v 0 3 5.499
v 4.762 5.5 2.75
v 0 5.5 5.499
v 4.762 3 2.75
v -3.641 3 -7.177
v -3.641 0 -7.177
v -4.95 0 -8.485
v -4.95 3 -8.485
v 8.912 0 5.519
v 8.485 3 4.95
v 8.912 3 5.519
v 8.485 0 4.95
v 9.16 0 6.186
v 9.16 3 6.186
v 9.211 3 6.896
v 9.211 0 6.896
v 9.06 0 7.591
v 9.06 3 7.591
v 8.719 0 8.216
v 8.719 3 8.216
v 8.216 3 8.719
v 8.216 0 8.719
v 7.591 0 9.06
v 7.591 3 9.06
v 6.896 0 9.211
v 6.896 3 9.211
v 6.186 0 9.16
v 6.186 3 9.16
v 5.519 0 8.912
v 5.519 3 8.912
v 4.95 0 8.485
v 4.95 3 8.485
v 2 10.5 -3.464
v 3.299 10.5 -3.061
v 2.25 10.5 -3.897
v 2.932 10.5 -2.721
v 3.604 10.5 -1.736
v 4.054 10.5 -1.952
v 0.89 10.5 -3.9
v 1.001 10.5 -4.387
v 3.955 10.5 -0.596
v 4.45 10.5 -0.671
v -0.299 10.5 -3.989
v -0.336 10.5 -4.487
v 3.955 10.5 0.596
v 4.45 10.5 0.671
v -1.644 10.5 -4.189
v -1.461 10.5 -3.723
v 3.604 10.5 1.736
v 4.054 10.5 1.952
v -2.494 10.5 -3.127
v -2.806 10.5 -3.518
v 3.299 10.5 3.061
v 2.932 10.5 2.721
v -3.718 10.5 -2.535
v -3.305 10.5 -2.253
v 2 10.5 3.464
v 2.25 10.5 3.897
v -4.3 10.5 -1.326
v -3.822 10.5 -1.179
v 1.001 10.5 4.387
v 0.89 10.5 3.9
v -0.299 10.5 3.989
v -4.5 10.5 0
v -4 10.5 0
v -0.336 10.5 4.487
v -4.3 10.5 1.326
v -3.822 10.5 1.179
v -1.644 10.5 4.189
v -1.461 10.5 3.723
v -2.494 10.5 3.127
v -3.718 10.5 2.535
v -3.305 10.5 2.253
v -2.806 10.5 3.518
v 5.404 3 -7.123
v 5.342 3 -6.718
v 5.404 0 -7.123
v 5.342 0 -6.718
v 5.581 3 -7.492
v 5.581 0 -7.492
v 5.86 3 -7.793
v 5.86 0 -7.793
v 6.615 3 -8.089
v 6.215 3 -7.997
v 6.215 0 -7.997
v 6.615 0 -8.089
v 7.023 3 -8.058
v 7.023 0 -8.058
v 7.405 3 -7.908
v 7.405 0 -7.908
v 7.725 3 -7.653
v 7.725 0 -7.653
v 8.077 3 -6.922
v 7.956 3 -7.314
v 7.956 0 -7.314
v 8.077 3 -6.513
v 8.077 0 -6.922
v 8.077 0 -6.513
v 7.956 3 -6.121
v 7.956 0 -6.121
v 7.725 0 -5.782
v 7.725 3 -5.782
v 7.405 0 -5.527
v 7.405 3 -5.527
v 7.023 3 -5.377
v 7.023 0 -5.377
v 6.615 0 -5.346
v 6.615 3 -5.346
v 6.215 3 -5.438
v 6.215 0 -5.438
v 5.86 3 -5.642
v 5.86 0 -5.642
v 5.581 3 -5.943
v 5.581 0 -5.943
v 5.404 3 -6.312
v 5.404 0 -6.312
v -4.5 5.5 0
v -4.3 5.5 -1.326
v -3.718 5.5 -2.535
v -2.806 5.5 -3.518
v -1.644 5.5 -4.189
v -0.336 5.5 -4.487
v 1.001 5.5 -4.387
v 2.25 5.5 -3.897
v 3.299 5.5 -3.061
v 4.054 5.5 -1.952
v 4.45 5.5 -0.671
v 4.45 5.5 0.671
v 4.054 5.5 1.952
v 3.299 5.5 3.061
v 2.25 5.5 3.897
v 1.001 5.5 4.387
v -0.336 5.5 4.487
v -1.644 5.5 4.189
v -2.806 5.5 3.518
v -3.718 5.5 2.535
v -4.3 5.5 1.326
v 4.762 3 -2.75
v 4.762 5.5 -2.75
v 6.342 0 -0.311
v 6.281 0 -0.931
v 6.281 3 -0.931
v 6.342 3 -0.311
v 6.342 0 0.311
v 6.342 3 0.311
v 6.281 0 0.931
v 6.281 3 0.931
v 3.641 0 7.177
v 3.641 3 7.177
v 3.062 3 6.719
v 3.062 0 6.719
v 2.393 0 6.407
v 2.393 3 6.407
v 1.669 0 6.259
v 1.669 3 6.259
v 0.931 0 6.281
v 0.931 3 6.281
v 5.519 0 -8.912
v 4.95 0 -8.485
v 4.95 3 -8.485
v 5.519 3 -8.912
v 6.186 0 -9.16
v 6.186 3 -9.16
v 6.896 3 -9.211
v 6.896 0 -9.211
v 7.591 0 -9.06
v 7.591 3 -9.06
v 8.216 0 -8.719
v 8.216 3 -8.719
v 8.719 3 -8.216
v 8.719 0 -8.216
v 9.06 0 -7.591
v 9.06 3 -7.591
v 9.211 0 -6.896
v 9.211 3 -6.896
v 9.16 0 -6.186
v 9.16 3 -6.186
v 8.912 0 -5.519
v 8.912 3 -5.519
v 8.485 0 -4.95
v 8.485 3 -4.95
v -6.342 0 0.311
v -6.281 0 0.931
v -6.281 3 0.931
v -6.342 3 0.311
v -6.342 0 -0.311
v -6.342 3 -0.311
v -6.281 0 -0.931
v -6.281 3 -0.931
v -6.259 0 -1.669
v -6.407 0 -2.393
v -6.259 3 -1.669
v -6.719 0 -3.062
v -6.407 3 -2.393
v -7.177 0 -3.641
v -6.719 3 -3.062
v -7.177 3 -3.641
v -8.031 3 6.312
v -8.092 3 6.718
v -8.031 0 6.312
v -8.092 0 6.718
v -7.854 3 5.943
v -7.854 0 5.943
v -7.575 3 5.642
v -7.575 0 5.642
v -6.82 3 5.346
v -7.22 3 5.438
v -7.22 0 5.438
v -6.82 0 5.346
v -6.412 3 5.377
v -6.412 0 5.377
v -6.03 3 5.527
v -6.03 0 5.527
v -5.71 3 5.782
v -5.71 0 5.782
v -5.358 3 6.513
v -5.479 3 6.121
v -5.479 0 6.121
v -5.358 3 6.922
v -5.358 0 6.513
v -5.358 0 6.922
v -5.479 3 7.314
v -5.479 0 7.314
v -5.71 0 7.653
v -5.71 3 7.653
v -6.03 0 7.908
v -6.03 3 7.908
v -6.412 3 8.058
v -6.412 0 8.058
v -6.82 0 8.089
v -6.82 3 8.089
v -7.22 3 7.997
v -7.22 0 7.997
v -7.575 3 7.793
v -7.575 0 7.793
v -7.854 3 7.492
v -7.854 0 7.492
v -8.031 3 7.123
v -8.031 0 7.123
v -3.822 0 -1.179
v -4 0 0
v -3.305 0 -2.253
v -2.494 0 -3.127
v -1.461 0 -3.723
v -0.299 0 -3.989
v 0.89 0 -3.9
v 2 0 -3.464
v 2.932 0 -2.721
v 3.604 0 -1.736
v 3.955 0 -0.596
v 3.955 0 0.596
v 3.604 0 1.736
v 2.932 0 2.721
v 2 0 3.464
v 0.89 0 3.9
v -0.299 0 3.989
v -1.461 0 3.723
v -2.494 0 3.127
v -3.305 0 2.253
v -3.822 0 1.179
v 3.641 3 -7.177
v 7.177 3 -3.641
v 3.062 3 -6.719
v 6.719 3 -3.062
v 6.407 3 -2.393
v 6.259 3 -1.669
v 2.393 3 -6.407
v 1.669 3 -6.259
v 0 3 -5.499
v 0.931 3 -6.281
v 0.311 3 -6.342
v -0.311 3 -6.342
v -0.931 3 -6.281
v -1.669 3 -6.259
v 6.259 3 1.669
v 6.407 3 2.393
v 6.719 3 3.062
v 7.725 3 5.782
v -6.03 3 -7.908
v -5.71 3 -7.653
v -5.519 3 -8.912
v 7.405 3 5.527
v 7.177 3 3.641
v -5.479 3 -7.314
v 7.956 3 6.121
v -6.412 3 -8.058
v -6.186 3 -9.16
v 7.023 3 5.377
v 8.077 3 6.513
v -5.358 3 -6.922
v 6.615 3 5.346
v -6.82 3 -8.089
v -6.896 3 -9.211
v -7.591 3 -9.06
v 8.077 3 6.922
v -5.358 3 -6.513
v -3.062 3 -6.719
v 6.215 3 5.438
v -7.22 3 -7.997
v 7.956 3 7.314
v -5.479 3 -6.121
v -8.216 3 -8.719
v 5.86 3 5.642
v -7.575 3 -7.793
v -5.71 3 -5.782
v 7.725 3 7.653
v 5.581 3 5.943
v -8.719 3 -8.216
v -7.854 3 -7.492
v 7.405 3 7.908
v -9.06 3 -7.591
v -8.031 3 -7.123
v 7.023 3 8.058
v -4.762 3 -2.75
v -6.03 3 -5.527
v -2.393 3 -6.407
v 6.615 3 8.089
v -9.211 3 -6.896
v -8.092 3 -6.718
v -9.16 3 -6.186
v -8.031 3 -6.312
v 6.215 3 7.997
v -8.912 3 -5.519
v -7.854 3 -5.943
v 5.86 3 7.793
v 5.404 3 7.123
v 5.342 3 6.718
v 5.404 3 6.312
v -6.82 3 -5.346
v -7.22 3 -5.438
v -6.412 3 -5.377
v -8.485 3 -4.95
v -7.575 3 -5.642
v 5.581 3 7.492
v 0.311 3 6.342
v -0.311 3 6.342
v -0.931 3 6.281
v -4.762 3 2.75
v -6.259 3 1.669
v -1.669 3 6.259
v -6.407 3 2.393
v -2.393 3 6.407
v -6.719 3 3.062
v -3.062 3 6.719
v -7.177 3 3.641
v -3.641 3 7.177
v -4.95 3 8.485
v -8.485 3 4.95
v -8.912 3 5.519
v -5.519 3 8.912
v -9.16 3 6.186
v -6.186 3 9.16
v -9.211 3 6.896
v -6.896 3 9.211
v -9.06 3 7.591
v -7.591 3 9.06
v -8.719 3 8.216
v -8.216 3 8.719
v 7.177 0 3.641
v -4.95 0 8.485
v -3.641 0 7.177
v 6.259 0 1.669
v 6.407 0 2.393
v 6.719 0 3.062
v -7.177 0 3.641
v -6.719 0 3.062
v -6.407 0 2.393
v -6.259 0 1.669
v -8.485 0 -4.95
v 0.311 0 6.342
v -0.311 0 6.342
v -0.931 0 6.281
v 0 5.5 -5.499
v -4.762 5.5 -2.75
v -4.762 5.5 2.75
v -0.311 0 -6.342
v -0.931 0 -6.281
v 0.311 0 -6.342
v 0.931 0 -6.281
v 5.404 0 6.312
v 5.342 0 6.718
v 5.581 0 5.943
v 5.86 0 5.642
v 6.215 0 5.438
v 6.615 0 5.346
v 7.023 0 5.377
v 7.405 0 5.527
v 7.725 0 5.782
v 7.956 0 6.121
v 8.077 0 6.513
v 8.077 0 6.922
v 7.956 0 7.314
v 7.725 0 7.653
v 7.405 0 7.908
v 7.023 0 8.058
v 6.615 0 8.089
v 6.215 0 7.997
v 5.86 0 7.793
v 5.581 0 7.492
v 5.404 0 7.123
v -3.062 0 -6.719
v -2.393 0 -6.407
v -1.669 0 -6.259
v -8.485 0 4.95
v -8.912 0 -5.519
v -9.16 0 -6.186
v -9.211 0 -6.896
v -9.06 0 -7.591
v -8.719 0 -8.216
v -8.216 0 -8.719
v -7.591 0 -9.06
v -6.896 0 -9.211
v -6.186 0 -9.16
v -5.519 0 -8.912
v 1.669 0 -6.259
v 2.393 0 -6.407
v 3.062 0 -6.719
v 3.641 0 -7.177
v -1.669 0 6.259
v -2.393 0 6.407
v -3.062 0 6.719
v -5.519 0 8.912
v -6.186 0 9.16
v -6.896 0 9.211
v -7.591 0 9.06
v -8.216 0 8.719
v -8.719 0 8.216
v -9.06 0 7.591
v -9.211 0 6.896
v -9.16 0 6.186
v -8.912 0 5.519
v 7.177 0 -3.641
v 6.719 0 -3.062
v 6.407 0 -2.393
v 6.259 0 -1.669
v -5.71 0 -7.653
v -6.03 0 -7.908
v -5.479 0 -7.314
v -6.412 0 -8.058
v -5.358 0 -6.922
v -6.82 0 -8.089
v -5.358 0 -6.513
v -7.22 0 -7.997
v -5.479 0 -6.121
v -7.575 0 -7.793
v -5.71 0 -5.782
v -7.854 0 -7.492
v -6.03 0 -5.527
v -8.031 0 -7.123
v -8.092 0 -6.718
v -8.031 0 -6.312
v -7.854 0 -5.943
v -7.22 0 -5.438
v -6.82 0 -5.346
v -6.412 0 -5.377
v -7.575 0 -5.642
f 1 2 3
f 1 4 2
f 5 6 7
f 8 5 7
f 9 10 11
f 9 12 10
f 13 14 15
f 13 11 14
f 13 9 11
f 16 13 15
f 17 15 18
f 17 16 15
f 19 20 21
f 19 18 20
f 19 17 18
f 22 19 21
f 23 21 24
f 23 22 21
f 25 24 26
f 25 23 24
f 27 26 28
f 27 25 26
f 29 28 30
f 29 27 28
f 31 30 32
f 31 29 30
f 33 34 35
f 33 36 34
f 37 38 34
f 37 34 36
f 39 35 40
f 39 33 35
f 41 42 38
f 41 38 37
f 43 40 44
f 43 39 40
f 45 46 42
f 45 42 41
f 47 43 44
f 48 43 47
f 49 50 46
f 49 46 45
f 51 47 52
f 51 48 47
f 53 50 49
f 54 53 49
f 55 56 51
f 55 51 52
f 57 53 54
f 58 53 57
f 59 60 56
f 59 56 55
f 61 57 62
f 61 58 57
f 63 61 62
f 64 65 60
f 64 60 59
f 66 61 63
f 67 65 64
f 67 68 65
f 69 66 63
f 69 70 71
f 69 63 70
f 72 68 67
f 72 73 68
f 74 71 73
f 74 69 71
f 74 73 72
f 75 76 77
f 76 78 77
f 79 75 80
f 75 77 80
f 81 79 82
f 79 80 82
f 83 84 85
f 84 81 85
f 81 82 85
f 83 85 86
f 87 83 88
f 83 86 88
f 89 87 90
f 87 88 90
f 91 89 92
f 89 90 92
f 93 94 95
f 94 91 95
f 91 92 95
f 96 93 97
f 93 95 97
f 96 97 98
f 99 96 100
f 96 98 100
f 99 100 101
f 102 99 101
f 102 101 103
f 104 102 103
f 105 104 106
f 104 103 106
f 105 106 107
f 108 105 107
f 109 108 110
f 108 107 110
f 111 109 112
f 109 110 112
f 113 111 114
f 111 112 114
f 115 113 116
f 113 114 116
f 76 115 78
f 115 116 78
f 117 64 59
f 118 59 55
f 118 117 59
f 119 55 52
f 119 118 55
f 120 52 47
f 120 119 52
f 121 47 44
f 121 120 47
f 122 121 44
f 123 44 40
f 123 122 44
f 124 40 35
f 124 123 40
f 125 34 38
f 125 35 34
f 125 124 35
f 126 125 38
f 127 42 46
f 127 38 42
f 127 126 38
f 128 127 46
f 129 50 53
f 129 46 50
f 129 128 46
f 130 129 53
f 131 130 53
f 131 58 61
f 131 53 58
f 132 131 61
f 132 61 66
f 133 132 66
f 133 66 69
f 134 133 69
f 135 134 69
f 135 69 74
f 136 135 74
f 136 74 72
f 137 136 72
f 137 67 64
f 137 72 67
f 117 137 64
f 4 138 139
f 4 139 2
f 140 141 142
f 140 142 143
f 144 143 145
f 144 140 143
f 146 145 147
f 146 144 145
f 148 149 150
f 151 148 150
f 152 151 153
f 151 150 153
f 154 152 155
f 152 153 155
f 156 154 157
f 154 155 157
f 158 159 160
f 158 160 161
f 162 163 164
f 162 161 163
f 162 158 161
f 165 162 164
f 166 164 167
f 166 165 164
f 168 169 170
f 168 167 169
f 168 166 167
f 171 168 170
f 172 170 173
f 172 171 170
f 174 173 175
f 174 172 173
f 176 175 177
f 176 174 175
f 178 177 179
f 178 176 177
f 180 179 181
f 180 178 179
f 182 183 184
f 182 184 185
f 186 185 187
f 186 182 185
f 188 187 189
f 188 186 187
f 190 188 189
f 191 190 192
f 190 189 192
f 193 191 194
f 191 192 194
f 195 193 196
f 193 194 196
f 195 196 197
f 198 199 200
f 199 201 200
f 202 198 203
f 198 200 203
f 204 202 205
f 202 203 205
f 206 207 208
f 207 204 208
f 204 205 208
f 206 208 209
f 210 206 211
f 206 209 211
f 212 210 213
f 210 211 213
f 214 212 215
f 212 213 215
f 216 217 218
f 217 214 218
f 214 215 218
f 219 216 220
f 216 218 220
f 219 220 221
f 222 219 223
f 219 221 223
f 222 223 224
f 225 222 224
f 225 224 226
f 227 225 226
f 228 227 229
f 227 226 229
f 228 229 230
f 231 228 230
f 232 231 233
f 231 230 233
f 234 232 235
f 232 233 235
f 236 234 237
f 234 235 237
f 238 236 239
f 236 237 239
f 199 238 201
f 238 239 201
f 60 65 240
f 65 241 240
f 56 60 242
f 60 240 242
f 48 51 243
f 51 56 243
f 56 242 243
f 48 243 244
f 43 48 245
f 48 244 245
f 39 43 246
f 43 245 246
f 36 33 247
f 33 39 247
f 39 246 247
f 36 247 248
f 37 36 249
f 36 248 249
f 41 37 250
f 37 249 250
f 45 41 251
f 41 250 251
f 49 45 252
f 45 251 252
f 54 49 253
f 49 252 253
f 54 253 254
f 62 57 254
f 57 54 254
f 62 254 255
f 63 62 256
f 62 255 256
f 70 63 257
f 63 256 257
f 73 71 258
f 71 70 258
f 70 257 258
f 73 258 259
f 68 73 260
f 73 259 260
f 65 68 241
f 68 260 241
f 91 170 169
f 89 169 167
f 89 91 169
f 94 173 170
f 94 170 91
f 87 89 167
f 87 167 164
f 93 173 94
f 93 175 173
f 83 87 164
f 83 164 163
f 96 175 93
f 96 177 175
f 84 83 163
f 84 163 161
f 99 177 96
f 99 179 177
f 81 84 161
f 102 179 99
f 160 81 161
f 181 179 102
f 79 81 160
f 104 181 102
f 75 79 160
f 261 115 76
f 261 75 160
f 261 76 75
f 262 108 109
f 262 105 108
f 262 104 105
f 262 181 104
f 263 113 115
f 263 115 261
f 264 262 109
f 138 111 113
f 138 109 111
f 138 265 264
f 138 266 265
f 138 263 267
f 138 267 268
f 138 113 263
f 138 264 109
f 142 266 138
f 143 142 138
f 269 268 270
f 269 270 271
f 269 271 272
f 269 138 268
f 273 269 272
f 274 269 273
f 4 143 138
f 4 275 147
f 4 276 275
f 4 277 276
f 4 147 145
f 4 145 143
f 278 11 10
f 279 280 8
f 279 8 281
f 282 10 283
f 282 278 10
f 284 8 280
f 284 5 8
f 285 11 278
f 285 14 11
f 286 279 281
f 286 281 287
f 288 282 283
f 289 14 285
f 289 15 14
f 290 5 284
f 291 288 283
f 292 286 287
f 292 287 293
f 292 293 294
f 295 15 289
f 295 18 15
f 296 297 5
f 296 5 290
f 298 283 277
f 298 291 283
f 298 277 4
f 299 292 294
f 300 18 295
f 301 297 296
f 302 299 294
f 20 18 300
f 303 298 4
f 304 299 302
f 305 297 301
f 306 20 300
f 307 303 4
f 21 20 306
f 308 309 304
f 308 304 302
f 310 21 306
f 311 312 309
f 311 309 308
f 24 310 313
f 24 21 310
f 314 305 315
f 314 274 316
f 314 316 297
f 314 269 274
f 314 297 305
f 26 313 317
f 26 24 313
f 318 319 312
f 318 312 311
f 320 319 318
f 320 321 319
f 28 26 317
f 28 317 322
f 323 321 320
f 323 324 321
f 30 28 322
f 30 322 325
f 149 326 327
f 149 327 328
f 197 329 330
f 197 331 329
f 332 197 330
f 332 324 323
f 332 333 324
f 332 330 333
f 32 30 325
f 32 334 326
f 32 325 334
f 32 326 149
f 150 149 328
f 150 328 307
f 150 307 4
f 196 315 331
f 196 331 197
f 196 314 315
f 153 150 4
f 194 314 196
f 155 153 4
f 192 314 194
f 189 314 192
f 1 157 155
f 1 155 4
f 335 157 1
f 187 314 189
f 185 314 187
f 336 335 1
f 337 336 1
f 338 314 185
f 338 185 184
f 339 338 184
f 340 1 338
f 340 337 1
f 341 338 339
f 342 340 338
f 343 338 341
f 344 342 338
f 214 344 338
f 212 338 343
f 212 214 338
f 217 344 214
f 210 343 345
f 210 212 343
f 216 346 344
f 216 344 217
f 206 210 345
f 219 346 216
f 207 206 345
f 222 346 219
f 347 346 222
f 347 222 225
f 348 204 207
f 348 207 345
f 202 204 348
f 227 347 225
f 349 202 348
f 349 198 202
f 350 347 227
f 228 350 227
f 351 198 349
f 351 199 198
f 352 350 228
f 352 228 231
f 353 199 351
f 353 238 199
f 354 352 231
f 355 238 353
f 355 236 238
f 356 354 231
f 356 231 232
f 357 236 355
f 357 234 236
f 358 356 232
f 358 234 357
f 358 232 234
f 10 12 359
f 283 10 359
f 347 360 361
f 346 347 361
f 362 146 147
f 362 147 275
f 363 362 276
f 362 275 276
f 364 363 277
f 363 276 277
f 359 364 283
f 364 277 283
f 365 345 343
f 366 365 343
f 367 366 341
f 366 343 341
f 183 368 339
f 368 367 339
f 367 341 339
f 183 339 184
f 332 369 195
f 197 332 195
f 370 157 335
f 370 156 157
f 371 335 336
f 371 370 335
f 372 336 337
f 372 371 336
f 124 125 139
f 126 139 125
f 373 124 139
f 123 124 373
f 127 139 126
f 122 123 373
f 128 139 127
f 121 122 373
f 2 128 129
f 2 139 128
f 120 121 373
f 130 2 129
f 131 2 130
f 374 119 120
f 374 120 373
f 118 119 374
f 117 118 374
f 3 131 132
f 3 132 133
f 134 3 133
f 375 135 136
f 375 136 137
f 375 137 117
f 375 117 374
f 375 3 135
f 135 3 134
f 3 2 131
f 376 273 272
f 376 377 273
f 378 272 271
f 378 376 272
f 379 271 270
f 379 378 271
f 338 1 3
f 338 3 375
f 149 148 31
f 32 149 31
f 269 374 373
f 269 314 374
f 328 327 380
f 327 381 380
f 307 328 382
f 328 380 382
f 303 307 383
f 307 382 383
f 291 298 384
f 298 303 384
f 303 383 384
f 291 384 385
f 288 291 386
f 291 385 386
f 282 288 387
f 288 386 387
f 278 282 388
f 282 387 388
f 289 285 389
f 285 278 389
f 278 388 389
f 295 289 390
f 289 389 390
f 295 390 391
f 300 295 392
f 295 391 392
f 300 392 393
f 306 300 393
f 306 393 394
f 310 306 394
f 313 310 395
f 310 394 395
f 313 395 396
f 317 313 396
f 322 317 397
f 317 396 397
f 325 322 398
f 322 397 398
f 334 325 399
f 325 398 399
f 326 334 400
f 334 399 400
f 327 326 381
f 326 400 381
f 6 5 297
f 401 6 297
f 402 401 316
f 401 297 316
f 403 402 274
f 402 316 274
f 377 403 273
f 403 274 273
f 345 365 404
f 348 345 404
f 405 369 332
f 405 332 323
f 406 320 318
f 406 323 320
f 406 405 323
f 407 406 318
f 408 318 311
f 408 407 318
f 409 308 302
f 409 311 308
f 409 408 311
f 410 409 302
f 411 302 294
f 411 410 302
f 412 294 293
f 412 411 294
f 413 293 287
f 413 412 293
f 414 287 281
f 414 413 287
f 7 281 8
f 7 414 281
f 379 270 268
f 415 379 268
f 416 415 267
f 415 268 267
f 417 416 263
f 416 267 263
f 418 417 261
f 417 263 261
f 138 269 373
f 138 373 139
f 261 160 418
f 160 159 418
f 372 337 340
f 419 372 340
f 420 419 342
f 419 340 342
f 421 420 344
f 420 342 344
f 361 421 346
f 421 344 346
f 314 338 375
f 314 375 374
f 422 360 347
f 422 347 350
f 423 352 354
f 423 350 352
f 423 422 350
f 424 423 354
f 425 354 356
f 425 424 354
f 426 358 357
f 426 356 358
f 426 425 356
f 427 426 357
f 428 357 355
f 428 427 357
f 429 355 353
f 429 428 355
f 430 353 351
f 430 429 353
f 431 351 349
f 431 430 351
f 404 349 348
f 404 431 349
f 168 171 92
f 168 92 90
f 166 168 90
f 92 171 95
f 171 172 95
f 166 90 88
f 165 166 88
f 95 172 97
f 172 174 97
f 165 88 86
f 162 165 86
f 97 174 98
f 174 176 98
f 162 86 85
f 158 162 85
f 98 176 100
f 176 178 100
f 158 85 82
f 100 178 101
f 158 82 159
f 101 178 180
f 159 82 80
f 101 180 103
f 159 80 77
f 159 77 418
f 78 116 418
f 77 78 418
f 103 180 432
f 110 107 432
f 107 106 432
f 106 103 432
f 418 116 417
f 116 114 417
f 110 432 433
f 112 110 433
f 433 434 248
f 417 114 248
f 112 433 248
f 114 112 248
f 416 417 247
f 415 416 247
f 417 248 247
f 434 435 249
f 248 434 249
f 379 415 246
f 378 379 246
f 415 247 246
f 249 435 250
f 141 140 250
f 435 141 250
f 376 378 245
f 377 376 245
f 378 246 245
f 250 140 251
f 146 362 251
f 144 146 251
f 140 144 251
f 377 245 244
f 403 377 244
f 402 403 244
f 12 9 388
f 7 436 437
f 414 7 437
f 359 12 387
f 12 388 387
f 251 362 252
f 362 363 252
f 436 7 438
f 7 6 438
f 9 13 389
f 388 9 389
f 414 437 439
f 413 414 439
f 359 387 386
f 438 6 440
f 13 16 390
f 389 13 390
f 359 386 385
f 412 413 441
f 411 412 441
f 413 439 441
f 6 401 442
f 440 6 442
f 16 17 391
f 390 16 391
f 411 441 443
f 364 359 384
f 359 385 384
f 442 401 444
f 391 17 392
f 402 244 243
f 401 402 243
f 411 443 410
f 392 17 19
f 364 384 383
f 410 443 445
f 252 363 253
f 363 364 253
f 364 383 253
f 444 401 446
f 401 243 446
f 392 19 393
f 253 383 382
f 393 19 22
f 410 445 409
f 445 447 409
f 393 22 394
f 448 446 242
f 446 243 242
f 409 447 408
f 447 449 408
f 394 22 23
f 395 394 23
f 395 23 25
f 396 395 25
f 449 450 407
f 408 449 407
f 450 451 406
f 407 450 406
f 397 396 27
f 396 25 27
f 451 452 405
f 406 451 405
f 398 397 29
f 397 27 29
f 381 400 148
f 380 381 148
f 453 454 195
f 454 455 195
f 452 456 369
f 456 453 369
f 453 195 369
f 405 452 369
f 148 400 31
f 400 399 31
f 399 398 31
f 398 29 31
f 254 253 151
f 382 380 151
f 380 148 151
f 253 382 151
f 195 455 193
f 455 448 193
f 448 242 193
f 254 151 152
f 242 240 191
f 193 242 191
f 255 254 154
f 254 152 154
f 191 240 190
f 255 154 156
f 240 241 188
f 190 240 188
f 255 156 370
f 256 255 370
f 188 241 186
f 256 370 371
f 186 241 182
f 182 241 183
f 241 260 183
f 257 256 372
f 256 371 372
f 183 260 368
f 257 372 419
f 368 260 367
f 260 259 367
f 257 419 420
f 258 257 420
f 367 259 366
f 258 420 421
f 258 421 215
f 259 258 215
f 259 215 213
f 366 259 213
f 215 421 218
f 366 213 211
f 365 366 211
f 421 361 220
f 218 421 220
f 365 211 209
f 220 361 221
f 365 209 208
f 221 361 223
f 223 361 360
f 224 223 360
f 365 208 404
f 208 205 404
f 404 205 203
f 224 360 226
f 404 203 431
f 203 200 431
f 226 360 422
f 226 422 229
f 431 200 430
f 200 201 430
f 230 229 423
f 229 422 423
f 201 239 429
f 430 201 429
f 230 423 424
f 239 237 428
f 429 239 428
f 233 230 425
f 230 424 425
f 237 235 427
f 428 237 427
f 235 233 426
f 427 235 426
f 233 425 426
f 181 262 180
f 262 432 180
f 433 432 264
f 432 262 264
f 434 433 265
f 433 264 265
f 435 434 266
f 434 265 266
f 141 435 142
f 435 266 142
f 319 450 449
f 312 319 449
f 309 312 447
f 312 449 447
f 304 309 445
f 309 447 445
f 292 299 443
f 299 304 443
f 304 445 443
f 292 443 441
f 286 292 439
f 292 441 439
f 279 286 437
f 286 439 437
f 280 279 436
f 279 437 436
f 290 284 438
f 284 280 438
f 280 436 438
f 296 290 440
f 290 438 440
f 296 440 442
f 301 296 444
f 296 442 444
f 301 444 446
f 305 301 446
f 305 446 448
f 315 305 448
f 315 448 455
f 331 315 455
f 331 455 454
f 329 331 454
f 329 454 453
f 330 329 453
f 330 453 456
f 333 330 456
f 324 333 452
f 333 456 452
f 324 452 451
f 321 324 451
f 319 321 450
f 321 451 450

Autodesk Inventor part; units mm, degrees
ref_plane "YZ Plane" through (0, 0, 0) normal (1, 0, 0) x (0, 1, 0)
ref_plane "XZ Plane" through (0, 0, 0) normal (0, 1, 0) x (-1, 0, 0)
ref_plane "XY Plane" through (0, 0, 0) normal (0, 0, 1) x (1, 0, 0)
sketch "Sketch1" plane through (0, 0, 0) normal (0, 1, 0) x (-1, 0, 0)
  circle A0 centre (0, 0) radius 9.5 construction
  circle A1 centre (0, 0) radius 9.5 construction
  line L0 (0, 0) -> (9.5, 0) construction
  line L1 (0, 0) -> (6.7175, -6.7175) construction
  circle A2 centre (6.7175, -6.7175) radius 1.375
  line L2 (0, 0) -> (6.7175, 6.7175) construction
  circle A3 centre (6.7175, 6.7175) radius 1.375
  circle A4 centre (-6.7175, -6.7175) radius 1.375
  circle A5 centre (-6.7175, 6.7175) radius 1.375
  circle A6 centre (0, 0) radius 4
  line L3 (-6.7175, -6.7175) -> (6.7175, 6.7175) construction
  arc A7 (-8.4853, -4.9497) -> (-4.9497, -8.4853) centre (-6.7175, -6.7175) ccw
  arc A8 (8.4853, 4.9497) -> (4.9497, 8.4853) centre (6.7175, 6.7175) ccw
  line L4 (-6.7175, 6.7175) -> (6.7175, -6.7175) construction
  arc A9 (-4.9497, 8.4853) -> (-8.4853, 4.9497) centre (-6.7175, 6.7175) ccw
  arc A10 (4.9497, -8.4853) -> (8.4853, -4.9497) centre (6.7175, -6.7175) ccw
  line L5 (4.7625, -2.7496) -> (0, -5.4993)
  line L6 (0, -5.4993) -> (-4.7625, -2.7496)
  line L7 (-4.7625, -2.7496) -> (-4.7625, 2.7496)
  line L8 (-4.7625, 2.7496) -> (0, 5.4993)
  line L9 (0, 5.4993) -> (4.7625, 2.7496)
  line L10 (4.7625, 2.7496) -> (4.7625, -2.7496)
  line L11 (-4.9497, -8.4853) -> (-1.245, -4.7805)
  line L12 (4.7625, 1.227) -> (8.4853, 4.9497)
  line L13 (4.9497, 8.4853) -> (1.245, 4.7805)
  line L14 (-4.7625, -1.227) -> (-8.4853, -4.9497)
  line L15 (-8.4853, 4.9497) -> (-4.7625, 1.227)
  line L16 (1.245, -4.7805) -> (4.9497, -8.4853)
  line L17 (8.4853, -4.9497) -> (4.7625, -1.227)
  line L18 (-1.245, 4.7805) -> (-4.9497, 8.4853)
  circle A11 centre (0, 0) radius 4.5
  circle A12 centre (0, 0) radius 6.35
  point P0 (4.7625, 0)
  point P1 (-2.3597, -5.8953)
  point P2 (2.3597, -5.8953)
  point P3 (-5.8953, 2.3597)
  point P4 (-5.8953, -2.3597)
  point P5 (2.3597, 5.8953)
  point P6 (-2.3597, 5.8953)
  point P7 (5.8953, 2.3597)
  point P8 (5.8953, -2.3597)
  dimension "d1" = 19
  dimension "d0" = 19
  dimension "d2" = 2.75
  dimension "d3" = 45
  dimension "d4" = 2.75
  dimension "d7" = 360
  dimension "d9" = 8
  dimension "d10" = 5
  dimension "d11" = 5
  dimension "d13" = 9.525
  dimension "d16" = 9
  dimension "d22" = 12.7
extrude "Extrusion1" add sketch "Sketch1" along normal blind 3 contours L14 A12 L11 A7 | A12 L15 L7 L14 | L14 L7 L6 L11 A12 | L11 L6 L5 L16 A12 | L7 L8 L9 L10 L5 L6 | A12 L18 L8 L7 L15 | L15 A9 L18 A12 | A12 L17 A10 L16 | L16 L5 L10 L17 A12 | A12 L13 L9 L8 L18 | L17 L10 L12 A12 | A12 L12 L10 L9 L13 | L13 A8 L12 A12 | A11
extrude "Extrusion2" add sketch "Sketch1" along normal blind 5.5 contours L7 L8 L9 L10 L5 L6 | A11
extrude "Extrusion3" add sketch "Sketch1" along normal blind 10.5 contours A11
fillet "Fillet1" radius 3.175 8 edges at (2.3597, 1.5, -5.8953) (-2.3597, 1.5, -5.8953) (-5.8953, 1.5, 2.3597) (-5.8953, 1.5, -2.3597) (-2.3597, 1.5, 5.8953) (2.3597, 1.5, 5.8953) (5.8953, 1.5, -2.3597) (5.8953, 1.5, 2.3597)
equation "\"d1\" = d0"
equation "\"d2\" = d4"
properties part number "Custom Base" material "Aluminum 6061"
